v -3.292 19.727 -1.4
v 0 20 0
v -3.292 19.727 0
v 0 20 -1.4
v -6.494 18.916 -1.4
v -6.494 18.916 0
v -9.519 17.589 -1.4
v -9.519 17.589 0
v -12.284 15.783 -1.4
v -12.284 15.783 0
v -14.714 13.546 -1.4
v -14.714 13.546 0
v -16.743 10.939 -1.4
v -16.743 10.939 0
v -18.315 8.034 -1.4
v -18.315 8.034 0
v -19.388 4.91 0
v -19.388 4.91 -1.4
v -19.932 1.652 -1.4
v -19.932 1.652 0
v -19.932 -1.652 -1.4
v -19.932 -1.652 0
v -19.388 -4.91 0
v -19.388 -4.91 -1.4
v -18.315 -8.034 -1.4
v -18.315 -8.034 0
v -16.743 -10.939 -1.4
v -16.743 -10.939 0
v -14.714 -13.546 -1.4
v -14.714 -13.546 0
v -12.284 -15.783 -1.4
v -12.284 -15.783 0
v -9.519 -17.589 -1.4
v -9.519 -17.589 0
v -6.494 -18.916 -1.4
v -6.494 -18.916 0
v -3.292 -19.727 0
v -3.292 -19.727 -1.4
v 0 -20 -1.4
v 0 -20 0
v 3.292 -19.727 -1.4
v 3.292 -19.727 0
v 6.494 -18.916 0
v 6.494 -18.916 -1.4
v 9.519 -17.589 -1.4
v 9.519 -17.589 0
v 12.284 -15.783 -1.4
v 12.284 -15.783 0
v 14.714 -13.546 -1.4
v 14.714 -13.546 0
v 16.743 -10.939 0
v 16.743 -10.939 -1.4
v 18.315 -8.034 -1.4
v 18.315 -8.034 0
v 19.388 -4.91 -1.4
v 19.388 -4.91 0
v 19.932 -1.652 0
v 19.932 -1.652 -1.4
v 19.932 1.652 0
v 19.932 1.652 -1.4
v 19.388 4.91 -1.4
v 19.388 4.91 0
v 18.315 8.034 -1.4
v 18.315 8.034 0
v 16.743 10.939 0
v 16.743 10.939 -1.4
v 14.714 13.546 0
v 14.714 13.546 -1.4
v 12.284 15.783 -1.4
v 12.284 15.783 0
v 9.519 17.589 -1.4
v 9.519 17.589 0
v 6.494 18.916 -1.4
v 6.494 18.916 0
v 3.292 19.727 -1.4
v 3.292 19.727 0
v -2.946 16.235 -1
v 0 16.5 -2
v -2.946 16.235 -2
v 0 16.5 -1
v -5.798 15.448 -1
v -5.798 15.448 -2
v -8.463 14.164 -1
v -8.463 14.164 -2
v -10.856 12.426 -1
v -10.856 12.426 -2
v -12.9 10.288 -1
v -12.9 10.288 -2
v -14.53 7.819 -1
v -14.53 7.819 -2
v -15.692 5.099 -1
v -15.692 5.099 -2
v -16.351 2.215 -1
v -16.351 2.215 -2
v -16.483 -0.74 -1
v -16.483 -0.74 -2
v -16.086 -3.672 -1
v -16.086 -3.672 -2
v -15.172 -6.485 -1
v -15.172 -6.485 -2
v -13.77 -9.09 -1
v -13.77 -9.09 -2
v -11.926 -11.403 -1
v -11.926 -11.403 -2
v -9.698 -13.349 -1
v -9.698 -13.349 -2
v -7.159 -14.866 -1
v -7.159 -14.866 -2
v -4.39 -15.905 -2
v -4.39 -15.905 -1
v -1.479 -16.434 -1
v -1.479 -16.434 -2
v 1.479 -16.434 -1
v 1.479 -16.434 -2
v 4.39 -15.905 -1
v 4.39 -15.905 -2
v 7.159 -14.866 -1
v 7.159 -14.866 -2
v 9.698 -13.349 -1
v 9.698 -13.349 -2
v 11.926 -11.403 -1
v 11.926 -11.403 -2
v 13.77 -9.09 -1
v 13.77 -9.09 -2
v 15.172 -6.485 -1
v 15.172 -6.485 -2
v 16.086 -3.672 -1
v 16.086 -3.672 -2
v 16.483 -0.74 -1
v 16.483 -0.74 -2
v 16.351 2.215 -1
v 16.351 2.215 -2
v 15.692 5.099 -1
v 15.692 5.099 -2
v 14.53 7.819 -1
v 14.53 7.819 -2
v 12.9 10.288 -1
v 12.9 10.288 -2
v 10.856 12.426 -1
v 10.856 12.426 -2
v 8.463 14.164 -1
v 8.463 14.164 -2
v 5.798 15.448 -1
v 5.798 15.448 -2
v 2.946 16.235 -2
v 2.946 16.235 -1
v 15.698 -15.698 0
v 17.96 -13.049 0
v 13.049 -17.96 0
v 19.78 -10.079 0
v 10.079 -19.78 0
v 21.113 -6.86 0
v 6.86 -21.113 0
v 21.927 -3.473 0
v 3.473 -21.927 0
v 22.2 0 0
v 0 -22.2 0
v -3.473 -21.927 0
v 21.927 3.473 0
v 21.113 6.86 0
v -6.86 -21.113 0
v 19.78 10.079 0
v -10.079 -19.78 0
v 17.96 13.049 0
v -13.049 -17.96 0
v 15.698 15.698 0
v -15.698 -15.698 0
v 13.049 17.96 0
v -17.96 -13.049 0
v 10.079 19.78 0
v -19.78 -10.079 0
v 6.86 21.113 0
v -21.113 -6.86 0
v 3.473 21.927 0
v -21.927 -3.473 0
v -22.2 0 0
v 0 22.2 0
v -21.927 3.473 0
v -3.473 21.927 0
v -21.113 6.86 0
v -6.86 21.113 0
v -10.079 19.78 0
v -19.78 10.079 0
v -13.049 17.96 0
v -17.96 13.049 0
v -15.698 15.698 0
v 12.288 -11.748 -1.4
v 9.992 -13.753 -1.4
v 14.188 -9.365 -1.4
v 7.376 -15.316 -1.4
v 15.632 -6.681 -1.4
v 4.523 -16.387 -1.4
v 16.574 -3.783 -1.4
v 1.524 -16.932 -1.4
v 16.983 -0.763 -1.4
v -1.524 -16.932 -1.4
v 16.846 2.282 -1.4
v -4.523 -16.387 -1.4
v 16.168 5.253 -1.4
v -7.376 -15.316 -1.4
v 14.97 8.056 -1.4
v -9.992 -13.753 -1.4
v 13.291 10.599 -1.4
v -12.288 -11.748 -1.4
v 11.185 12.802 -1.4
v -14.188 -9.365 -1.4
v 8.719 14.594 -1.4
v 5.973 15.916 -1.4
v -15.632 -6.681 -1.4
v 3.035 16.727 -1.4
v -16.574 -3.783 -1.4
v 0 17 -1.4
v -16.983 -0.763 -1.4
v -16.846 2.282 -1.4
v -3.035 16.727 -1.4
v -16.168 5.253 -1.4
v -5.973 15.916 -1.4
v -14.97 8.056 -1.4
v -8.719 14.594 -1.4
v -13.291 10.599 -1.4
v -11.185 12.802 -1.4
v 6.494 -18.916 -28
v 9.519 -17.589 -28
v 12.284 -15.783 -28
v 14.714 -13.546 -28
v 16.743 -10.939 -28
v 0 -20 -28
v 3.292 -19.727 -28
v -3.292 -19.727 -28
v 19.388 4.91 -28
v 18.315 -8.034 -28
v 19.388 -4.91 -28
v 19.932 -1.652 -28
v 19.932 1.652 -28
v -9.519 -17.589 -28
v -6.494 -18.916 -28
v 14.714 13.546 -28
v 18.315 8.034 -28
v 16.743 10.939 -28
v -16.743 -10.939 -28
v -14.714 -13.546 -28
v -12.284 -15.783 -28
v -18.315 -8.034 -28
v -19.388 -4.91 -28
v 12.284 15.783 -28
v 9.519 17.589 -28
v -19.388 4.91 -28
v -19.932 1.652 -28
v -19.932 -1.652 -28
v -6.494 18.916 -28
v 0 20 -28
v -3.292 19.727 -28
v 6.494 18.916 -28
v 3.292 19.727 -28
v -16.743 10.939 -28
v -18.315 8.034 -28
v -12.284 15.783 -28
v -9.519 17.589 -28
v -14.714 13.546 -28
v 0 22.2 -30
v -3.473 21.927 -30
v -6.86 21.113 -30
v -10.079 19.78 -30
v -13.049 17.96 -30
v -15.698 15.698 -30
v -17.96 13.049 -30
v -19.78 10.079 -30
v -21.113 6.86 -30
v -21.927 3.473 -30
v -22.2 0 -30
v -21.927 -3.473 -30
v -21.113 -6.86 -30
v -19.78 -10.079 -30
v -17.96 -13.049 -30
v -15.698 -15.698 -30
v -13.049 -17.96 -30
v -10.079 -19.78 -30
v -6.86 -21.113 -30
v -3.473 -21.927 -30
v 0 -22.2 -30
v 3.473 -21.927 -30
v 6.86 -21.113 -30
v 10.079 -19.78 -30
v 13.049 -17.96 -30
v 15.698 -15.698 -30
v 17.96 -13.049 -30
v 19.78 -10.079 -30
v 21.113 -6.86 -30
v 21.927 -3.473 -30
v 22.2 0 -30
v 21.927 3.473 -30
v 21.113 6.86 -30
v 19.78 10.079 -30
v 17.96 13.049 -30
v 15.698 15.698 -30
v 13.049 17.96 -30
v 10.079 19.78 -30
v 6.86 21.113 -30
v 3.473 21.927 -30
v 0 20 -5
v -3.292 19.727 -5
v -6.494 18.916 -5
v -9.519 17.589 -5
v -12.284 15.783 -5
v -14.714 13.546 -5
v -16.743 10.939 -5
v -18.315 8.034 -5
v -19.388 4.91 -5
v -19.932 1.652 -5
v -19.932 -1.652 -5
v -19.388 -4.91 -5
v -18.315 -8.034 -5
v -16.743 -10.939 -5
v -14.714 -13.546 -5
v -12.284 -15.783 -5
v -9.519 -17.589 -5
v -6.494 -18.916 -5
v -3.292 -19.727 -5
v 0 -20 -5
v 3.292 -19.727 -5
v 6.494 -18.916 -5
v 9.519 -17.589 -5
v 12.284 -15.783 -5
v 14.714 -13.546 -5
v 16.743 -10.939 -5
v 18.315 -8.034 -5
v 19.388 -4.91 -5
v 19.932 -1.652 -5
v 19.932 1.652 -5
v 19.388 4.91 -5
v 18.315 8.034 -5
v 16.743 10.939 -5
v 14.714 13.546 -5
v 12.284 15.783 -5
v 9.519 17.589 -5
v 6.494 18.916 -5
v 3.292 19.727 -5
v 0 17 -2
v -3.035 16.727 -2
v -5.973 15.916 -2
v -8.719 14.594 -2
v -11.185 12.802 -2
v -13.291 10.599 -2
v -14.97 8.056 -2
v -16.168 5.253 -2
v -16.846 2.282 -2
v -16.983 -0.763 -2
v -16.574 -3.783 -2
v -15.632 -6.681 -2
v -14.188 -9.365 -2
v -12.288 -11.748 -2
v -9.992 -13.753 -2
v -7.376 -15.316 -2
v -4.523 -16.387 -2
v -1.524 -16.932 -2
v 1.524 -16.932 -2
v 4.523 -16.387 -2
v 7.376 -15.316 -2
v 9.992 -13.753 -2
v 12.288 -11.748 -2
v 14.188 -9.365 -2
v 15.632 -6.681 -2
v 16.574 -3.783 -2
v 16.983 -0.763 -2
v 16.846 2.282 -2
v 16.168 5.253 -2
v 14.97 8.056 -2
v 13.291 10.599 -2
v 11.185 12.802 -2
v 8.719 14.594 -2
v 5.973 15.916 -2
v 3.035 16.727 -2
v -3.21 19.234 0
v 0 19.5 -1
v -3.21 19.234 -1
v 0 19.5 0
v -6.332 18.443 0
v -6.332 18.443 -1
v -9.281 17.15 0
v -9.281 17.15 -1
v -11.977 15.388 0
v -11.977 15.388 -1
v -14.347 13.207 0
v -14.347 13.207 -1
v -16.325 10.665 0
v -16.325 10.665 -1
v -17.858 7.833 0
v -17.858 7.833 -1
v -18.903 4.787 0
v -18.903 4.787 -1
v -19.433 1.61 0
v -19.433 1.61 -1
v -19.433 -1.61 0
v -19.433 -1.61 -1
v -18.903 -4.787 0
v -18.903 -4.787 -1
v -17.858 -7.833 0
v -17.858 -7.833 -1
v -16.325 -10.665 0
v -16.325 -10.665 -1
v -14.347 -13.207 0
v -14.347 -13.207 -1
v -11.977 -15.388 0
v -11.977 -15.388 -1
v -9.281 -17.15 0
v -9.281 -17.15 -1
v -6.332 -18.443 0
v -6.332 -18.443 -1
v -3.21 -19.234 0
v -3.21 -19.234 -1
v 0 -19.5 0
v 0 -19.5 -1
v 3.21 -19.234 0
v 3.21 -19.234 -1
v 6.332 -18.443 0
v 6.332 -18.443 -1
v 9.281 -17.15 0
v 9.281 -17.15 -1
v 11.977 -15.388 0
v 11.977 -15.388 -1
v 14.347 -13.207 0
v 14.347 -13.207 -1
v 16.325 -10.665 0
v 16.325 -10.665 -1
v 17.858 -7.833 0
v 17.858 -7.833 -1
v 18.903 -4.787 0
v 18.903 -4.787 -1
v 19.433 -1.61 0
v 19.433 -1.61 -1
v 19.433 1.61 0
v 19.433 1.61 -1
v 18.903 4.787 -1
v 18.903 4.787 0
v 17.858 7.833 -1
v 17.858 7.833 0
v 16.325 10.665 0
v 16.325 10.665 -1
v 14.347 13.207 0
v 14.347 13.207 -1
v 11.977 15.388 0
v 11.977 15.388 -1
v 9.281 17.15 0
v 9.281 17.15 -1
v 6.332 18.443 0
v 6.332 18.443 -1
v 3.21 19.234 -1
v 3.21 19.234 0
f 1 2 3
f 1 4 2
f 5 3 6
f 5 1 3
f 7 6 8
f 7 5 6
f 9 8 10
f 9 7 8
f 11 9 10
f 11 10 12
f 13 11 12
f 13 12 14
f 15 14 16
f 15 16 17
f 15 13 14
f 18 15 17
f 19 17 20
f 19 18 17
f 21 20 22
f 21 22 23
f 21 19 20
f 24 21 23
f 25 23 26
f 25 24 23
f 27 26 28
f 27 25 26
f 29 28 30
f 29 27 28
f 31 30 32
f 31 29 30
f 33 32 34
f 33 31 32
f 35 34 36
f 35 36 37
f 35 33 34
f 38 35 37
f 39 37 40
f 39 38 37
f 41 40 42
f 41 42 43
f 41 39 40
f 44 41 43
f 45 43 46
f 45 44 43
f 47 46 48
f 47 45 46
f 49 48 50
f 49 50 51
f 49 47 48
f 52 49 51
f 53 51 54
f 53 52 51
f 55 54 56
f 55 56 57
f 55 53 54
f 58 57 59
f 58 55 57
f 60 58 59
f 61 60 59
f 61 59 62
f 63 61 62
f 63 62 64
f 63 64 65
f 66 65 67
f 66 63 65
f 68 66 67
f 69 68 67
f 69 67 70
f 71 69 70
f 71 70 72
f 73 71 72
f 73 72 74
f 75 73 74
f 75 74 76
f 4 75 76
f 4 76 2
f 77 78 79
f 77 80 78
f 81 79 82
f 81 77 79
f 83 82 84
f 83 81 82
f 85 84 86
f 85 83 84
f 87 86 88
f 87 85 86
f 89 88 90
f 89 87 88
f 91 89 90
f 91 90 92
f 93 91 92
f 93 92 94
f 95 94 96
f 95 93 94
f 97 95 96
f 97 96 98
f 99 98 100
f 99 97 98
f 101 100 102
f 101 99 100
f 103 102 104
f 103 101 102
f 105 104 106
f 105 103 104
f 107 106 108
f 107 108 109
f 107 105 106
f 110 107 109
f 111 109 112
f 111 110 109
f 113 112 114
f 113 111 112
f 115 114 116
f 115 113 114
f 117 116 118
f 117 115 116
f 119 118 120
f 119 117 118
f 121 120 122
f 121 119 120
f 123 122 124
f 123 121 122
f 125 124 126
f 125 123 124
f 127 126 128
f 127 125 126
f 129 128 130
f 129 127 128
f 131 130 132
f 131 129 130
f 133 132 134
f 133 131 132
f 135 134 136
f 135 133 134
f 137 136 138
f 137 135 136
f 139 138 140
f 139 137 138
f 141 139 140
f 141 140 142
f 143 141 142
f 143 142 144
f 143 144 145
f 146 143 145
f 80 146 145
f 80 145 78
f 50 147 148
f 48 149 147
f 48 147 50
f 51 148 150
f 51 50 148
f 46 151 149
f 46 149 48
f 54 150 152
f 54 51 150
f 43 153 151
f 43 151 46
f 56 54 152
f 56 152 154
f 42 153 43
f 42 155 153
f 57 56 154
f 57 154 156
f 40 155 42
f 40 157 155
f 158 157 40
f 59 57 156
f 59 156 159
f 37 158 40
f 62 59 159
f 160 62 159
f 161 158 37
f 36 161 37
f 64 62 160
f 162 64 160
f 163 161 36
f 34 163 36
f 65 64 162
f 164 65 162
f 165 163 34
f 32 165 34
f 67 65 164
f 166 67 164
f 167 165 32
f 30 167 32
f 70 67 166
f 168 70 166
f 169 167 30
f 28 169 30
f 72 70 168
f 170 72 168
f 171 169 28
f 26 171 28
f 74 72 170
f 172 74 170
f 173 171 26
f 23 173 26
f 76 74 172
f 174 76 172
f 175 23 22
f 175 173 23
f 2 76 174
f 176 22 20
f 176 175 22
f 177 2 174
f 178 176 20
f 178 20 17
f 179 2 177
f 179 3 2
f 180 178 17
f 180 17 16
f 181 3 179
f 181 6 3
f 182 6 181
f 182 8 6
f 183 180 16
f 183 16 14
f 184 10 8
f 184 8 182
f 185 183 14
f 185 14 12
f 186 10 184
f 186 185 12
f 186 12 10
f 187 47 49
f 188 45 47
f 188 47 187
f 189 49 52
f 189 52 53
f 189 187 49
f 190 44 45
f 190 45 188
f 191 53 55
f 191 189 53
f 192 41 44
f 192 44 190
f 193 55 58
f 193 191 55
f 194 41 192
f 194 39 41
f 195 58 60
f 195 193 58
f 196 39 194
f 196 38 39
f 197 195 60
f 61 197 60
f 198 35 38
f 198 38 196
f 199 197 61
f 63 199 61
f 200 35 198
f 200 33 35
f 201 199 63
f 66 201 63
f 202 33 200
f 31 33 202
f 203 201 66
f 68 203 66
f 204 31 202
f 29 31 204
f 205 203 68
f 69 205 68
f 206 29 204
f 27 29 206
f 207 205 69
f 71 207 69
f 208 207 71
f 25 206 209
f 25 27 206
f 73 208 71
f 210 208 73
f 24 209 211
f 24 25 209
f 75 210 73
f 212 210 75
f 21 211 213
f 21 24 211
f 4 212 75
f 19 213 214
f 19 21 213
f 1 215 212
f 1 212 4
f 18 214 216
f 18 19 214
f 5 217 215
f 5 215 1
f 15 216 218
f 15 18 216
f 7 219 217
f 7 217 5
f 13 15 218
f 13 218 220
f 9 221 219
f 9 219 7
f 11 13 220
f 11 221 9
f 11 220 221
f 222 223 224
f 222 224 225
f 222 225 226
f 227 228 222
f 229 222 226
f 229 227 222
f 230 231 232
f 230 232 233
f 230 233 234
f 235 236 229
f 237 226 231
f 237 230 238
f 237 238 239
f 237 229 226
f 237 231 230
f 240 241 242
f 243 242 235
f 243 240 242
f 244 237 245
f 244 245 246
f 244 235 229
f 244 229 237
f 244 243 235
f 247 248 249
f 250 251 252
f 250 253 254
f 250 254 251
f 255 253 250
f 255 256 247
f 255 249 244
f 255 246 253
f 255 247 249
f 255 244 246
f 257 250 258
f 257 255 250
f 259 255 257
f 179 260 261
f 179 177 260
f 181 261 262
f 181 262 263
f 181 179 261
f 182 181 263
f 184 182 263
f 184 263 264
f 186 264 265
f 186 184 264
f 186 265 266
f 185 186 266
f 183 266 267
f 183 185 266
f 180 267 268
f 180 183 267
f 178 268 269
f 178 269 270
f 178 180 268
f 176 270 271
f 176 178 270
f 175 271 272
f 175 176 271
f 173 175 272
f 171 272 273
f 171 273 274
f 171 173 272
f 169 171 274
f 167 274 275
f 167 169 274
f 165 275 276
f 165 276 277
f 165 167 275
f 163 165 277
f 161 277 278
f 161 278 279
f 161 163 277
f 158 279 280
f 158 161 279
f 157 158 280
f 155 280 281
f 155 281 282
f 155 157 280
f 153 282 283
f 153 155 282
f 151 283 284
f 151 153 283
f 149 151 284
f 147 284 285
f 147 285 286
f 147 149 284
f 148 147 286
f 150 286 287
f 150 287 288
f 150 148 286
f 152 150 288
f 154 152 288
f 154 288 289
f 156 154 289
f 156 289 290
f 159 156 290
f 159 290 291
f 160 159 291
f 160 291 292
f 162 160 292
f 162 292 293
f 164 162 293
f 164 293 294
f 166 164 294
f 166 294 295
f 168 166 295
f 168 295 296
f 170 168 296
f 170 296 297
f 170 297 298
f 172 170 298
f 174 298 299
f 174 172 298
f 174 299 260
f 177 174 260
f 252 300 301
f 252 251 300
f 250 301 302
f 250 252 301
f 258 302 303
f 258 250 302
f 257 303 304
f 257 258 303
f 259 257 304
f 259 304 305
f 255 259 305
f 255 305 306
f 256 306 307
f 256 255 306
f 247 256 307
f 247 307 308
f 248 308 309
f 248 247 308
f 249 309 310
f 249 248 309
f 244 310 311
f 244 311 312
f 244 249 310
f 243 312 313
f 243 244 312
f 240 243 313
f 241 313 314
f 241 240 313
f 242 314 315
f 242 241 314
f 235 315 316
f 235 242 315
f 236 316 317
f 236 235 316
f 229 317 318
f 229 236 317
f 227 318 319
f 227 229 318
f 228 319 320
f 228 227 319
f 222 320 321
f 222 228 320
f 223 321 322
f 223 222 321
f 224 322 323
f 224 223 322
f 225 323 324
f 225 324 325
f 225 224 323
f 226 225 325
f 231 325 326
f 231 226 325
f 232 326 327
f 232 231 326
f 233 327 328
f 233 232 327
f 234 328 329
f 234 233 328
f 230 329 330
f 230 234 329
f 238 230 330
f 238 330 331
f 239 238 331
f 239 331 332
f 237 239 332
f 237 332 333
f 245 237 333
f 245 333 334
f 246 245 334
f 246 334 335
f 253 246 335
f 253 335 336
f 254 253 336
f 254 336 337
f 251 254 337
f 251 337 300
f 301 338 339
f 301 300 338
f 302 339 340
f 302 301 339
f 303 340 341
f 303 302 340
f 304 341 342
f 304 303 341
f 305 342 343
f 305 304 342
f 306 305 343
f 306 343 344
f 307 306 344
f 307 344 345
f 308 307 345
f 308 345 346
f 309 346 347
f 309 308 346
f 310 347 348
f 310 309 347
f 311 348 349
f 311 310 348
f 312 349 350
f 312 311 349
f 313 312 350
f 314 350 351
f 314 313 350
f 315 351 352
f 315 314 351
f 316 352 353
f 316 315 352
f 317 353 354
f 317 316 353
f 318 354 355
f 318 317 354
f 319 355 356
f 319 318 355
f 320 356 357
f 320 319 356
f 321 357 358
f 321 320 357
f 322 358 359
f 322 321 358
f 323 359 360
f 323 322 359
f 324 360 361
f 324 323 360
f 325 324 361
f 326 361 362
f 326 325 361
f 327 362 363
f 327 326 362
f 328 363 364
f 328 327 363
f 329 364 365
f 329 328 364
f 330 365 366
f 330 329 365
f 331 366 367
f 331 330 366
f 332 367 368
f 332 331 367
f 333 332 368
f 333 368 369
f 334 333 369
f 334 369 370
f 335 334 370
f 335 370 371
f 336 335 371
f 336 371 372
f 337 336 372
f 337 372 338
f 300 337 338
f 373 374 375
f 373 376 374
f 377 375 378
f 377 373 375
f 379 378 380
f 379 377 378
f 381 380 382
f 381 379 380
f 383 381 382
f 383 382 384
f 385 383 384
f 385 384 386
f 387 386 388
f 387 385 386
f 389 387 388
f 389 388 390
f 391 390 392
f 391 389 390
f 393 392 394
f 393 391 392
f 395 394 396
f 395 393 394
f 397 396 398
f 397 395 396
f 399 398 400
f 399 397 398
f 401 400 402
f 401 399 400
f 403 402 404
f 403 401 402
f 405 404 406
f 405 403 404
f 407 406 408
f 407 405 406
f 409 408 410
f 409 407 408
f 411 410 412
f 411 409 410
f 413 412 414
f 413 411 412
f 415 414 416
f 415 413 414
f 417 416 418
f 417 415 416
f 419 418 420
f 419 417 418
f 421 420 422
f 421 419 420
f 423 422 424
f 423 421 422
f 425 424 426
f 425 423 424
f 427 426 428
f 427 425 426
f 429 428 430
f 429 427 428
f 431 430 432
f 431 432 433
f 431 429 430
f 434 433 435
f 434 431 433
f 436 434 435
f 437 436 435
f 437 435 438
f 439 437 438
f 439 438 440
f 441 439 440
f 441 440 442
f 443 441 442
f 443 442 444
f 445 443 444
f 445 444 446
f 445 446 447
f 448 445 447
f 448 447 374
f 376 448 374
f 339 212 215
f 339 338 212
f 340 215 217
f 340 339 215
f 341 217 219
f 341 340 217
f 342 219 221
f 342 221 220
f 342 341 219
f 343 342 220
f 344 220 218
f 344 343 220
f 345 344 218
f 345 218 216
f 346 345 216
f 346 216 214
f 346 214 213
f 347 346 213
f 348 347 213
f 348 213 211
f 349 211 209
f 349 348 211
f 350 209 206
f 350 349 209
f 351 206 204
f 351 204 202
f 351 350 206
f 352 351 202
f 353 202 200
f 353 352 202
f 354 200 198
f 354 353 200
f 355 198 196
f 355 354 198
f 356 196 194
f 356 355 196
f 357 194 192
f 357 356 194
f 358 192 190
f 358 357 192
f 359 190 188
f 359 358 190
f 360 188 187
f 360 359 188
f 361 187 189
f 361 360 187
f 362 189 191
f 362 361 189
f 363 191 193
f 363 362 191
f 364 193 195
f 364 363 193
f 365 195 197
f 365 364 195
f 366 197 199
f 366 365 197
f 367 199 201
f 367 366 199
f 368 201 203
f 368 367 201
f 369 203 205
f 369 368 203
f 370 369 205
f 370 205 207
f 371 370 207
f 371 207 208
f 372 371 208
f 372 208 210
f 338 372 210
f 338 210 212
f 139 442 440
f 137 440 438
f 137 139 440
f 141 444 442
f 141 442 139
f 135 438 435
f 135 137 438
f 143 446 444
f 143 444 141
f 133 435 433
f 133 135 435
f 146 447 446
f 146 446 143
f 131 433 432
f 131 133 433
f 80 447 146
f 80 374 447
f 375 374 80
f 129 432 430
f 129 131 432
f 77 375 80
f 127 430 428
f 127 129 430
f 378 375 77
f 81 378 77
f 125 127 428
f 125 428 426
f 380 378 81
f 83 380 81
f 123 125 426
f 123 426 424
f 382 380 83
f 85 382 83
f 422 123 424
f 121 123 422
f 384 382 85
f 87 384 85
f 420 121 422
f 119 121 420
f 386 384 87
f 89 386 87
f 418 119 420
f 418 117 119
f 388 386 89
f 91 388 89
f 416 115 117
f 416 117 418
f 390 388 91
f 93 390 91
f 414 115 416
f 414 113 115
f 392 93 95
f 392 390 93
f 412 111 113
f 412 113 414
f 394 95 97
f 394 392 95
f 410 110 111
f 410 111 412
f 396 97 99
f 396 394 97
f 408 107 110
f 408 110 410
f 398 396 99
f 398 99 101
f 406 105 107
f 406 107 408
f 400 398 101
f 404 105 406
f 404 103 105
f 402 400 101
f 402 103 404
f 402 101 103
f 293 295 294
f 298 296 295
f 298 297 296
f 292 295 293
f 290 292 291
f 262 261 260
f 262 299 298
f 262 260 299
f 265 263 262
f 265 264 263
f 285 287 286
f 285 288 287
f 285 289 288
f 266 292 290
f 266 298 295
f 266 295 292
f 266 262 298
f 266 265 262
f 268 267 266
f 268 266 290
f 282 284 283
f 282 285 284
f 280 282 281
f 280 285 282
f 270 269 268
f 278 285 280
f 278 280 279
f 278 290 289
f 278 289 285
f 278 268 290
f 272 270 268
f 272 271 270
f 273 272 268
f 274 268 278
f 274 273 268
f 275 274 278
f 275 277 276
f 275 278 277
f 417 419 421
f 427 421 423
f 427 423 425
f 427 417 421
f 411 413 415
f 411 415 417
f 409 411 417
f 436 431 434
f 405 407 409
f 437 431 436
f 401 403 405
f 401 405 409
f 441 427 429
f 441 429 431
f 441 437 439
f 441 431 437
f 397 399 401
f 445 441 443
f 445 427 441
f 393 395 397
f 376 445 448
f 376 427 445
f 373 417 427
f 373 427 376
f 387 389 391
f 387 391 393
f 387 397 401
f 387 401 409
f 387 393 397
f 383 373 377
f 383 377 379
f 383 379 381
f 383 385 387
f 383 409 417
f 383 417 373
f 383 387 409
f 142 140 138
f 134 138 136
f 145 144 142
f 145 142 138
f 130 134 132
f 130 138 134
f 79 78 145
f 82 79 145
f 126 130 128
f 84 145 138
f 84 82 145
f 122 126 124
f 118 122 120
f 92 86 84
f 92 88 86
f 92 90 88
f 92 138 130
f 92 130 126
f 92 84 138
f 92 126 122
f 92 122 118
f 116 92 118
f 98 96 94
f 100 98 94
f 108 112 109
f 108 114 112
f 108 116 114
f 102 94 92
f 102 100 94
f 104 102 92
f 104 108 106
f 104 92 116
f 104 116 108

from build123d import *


with BuildPart() as f1:
    # F0 (on Right) → F1 (revolve)
    with BuildSketch(Plane.YZ):
        Polygon((22.2, -30), (22.2, 0), (20, 0), (20, -1.4), (17, -1.4), (17, -2), (20, -5), (20, -28), (0, -28), (0, -30), align=None)
        Polygon((19.5, -1), (19.5, 0), (0, 0), (0, -2), (16.5, -2), (16.5, -1), align=None)
    revolve(axis=Axis((0, 0, -29), (0, 0, 1)))


solid = f1.part
